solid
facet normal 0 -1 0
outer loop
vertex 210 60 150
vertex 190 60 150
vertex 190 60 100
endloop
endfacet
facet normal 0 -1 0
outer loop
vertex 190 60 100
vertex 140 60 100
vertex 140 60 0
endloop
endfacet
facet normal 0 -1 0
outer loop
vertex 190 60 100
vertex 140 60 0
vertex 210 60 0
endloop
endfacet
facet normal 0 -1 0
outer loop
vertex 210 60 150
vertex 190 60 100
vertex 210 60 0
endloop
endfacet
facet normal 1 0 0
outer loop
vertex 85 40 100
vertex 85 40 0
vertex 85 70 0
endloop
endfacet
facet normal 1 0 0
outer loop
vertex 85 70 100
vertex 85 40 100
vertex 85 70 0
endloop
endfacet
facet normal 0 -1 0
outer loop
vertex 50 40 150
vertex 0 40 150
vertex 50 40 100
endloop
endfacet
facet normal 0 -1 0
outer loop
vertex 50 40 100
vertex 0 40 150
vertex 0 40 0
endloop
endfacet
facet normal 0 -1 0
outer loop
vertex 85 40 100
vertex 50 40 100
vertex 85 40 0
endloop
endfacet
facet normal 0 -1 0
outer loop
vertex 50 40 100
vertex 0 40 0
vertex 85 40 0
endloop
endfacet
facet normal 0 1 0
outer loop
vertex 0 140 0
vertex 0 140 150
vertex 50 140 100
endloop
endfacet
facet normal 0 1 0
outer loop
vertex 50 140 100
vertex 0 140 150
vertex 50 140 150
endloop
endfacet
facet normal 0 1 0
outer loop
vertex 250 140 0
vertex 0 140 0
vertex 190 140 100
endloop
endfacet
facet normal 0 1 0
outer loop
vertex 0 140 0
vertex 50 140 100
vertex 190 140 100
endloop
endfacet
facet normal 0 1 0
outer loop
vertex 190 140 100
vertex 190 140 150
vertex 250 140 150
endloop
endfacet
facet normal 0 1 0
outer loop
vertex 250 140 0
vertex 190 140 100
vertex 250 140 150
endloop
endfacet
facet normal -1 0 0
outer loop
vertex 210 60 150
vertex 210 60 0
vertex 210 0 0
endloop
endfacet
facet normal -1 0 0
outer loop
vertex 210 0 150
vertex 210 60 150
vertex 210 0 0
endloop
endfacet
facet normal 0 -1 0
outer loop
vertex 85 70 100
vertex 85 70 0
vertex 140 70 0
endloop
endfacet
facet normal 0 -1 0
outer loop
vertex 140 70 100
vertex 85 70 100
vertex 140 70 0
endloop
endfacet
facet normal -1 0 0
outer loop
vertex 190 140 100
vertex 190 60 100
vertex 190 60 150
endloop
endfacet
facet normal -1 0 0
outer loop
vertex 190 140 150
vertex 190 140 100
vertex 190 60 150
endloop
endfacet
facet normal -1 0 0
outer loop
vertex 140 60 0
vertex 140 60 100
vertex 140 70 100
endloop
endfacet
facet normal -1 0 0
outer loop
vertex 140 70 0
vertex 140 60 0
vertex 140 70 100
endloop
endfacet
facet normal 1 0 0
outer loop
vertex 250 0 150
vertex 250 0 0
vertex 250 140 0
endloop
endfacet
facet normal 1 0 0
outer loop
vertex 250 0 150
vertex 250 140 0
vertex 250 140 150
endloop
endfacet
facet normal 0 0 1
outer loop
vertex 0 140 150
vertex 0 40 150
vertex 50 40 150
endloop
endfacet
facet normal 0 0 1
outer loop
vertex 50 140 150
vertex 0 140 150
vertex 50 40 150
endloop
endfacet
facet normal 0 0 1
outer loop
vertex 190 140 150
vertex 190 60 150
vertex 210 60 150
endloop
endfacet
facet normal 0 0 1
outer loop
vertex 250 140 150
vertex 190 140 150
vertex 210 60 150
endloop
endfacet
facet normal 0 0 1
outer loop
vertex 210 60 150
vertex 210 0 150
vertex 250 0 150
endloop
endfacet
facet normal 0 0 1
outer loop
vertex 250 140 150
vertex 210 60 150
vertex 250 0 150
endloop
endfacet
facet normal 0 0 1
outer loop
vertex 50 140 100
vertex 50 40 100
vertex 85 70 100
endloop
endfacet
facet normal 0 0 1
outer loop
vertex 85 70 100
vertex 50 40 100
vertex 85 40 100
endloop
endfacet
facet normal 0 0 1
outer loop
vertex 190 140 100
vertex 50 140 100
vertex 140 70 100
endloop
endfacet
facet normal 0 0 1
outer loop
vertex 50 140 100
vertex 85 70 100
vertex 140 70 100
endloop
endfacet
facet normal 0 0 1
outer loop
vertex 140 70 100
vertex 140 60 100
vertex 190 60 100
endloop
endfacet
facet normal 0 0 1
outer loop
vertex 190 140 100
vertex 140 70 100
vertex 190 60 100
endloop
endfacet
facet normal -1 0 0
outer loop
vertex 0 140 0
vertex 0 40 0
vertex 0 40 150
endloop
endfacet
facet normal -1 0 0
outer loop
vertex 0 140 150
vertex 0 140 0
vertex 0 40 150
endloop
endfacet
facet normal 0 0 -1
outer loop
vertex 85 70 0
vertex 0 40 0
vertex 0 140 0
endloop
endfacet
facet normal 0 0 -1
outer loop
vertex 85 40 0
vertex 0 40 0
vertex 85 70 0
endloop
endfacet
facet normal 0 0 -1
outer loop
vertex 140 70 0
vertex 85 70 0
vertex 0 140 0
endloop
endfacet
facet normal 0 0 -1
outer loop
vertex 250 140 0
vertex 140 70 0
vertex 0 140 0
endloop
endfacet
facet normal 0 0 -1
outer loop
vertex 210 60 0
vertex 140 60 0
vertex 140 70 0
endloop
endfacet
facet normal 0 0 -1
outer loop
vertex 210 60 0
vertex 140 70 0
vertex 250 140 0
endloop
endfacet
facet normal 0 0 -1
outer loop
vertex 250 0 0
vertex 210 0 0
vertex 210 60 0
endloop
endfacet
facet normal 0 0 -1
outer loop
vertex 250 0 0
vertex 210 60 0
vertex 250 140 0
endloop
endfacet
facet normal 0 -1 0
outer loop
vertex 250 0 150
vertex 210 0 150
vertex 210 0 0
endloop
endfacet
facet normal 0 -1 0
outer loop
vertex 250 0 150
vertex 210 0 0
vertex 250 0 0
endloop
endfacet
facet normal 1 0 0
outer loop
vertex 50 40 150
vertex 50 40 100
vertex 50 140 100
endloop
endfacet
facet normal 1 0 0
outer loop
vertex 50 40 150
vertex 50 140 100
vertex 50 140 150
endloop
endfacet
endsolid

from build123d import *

# Parameters (mm, degrees)
F0_W     = 250
F0_H     = 150
F1_DEPTH = 140
F2_W     = 140
F2_H     = 50
F3_DEPTH = 140.001
F4_W     = 210
F4_H     = 40
F5_DEPTH = 150.001
F6_W     = 55
F6_H     = 30
F7_DEPTH = 100.001
F8_W     = 70
F8_H     = 20
F9_DEPTH = 150.001


with BuildPart() as f1:
    # F0 (on Front) → F1 (new body)
    with BuildSketch(Plane.XZ):
        with Locations((125, 75)):
            Rectangle(F0_W, F0_H)
    extrude(amount=-F1_DEPTH)

    # F2 (on face) → F3 (cut, through all)
    with BuildSketch(Plane.XZ):
        with Locations((120, 125)):
            Rectangle(F2_W, F2_H)
    extrude(amount=-F3_DEPTH, mode=Mode.SUBTRACT)

    # F4 (on face) → F5 (cut, through all)
    with BuildSketch(Plane(origin=(0, 0, 0), x_dir=(1, 0, 0), z_dir=(0, 0, -1))):
        with Locations((105, -20)):
            Rectangle(F4_W, F4_H)
    extrude(amount=-F5_DEPTH, mode=Mode.SUBTRACT)

    # F6 (on face) → F7 (cut, through all)
    with BuildSketch(Plane.XY.offset(100)):
        with Locations((112.5, 55)):
            Rectangle(F6_W, F6_H)
    extrude(amount=-F7_DEPTH, mode=Mode.SUBTRACT)

    # F8 (on face) → F9 (cut, through all)
    with BuildSketch(Plane(origin=(0, 0, 0), x_dir=(1, 0, 0), z_dir=(0, 0, -1))):
        with Locations((175, -50)):
            Rectangle(F8_W, F8_H)
    extrude(amount=-F9_DEPTH, mode=Mode.SUBTRACT)


solid = f1.part
